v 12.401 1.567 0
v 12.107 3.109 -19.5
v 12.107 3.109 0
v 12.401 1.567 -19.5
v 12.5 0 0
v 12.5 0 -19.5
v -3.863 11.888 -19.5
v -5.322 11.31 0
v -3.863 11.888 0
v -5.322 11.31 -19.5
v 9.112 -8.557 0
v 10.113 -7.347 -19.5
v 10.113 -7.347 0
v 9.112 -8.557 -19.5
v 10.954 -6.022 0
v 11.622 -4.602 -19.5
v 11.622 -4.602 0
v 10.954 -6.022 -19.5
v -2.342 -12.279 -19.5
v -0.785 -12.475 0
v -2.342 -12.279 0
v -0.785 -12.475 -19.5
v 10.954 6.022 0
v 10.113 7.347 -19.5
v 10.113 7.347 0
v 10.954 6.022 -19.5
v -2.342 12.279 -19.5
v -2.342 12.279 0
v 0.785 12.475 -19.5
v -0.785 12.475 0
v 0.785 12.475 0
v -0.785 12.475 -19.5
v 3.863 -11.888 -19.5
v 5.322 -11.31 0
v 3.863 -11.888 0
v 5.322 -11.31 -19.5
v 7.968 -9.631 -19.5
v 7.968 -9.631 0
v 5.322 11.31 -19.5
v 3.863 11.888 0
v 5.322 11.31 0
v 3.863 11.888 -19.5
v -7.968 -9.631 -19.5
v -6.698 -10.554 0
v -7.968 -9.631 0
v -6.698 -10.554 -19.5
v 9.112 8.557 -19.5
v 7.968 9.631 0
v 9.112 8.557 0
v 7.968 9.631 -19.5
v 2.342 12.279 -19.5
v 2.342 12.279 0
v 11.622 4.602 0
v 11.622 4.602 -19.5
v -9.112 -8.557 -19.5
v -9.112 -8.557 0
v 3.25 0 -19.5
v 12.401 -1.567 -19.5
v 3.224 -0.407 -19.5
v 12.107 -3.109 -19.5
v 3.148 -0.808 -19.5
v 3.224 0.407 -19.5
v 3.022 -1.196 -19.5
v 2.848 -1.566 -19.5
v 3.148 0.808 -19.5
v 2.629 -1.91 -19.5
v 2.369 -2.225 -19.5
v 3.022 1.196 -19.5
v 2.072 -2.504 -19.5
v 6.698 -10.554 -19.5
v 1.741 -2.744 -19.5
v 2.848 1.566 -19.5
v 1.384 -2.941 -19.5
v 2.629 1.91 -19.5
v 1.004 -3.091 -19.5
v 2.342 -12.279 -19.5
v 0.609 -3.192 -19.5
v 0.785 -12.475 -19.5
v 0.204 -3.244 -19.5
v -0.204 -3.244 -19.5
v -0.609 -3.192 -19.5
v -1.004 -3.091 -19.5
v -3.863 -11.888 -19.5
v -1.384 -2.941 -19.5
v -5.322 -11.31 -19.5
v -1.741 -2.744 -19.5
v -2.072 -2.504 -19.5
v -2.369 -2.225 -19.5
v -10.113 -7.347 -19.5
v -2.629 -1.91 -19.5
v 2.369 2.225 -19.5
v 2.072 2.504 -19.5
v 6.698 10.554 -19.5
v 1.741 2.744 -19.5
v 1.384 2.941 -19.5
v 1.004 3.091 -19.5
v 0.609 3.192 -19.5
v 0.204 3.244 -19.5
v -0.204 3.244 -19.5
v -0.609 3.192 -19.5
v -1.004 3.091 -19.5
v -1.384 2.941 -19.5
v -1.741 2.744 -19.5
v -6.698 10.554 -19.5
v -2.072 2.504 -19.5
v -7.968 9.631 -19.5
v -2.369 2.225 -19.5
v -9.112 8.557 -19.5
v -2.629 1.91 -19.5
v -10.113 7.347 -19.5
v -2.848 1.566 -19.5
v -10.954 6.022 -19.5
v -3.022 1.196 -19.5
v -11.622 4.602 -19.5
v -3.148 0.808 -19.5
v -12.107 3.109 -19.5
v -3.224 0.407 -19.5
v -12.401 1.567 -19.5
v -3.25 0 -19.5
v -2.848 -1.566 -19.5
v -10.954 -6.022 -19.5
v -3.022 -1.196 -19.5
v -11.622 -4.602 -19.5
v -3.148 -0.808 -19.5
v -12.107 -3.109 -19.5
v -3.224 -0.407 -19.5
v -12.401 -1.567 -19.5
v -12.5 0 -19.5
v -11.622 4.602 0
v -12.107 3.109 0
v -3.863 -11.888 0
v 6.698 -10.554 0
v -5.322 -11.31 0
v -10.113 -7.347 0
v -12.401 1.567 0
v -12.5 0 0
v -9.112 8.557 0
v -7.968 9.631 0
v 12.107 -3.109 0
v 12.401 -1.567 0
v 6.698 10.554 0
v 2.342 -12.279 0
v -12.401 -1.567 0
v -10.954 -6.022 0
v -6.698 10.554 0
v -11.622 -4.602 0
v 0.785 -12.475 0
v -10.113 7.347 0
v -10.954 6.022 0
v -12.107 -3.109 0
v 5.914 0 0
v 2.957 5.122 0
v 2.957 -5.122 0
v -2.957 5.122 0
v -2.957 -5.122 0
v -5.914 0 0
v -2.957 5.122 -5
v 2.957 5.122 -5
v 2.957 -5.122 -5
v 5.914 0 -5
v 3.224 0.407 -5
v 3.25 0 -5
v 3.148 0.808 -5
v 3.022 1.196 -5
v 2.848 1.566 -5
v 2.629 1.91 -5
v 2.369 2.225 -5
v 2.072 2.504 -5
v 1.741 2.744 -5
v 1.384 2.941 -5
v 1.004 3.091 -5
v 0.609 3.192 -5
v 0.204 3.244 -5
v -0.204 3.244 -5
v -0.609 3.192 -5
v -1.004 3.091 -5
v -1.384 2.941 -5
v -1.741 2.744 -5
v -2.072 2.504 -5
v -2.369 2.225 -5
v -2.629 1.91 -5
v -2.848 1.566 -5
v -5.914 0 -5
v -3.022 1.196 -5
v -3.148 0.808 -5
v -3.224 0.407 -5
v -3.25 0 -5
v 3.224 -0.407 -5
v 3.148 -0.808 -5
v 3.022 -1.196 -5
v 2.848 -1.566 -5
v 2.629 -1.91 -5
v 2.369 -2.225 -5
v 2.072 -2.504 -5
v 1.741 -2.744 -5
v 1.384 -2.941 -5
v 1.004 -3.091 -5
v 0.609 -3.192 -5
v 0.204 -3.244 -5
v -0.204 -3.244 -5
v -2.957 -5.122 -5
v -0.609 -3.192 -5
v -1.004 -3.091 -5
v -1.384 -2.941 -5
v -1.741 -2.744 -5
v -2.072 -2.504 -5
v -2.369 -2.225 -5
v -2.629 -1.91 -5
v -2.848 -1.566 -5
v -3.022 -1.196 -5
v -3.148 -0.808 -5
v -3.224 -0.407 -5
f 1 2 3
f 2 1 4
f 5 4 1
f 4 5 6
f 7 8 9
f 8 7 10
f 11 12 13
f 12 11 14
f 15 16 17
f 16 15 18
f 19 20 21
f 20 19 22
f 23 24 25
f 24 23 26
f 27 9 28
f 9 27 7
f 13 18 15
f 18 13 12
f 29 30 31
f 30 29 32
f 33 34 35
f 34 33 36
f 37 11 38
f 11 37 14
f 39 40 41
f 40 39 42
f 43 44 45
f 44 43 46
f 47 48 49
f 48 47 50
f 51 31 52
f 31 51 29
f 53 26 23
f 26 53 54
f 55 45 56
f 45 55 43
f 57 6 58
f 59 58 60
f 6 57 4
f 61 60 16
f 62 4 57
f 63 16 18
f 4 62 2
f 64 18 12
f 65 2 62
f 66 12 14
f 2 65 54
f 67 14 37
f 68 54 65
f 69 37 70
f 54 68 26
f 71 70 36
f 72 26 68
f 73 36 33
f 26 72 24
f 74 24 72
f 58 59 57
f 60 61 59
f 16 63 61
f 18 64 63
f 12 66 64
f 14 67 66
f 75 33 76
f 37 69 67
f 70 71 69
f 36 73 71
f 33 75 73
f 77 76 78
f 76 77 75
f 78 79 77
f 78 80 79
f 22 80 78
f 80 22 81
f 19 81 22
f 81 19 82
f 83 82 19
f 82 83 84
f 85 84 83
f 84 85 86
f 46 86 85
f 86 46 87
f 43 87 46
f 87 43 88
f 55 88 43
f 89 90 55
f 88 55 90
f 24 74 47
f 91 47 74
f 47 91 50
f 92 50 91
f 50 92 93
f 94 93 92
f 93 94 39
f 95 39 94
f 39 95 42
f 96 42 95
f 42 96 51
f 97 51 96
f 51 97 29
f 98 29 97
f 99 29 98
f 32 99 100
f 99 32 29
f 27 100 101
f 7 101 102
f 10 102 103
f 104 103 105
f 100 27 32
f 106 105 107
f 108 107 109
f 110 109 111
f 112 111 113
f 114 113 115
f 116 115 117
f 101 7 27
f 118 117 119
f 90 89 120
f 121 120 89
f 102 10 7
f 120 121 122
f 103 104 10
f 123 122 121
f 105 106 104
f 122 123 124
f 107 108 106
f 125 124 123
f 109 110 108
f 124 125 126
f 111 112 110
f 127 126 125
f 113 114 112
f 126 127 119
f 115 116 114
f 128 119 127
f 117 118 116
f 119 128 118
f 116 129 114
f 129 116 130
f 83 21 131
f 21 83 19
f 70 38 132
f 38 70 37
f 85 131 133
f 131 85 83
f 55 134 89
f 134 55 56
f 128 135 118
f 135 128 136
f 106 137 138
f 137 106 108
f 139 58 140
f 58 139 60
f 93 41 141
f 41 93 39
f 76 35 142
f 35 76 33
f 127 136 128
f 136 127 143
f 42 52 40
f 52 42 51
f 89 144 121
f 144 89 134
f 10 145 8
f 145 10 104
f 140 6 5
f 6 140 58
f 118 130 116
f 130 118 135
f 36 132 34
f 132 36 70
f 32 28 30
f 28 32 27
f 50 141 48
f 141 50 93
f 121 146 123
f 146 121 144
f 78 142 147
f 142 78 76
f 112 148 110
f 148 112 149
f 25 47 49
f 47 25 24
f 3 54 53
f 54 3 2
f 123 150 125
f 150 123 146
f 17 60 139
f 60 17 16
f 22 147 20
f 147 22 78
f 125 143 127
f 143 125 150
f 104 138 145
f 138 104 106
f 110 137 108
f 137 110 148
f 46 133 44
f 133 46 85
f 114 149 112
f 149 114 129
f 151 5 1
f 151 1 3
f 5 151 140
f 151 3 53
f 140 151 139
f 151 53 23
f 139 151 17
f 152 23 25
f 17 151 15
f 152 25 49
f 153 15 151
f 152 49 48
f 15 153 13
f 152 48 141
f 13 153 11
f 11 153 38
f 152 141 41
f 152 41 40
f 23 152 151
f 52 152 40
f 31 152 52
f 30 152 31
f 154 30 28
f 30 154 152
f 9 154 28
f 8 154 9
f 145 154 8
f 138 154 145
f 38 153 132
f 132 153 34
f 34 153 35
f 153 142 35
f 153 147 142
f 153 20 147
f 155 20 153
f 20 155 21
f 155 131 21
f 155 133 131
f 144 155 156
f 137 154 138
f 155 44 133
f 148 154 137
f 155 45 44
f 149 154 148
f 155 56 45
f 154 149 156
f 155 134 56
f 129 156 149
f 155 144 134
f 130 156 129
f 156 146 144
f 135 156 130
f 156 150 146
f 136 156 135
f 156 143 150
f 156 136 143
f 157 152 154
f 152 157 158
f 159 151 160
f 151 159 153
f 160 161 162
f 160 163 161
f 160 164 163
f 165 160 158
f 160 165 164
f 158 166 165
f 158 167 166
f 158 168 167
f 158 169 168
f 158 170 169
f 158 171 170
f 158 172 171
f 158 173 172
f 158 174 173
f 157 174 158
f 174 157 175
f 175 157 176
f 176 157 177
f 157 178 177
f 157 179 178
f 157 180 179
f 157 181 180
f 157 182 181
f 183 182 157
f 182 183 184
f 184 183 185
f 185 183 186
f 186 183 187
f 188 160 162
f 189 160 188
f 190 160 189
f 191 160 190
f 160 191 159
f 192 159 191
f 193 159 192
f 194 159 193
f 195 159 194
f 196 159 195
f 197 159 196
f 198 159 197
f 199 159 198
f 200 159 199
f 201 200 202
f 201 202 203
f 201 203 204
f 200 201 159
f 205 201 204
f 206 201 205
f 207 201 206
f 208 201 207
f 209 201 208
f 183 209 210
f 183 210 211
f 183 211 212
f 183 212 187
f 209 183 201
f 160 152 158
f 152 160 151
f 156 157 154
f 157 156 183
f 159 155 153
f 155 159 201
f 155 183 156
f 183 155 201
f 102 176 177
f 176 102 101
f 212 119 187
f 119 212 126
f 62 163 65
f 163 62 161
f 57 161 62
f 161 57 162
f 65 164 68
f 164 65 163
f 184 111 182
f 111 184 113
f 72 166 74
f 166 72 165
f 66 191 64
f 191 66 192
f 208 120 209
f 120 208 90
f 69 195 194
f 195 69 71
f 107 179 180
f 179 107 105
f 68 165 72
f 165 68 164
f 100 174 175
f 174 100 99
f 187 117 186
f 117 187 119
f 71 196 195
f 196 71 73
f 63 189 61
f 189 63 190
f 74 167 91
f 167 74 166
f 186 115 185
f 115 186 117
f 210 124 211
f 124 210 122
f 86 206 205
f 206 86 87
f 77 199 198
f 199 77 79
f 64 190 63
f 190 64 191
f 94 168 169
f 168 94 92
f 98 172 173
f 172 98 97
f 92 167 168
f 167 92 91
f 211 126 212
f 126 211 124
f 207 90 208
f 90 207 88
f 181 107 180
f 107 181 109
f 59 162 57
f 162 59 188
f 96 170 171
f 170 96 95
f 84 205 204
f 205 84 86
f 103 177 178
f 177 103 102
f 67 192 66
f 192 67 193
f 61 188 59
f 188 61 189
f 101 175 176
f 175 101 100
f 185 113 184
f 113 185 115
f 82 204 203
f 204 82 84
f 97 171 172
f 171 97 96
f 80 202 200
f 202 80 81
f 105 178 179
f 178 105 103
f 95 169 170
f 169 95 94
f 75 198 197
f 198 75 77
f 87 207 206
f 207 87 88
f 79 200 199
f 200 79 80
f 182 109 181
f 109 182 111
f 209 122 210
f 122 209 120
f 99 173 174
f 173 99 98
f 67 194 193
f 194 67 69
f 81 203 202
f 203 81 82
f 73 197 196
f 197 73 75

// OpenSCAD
$fn = 50;

difference() {
	union() {
		translate(v = [0, 0, -19.5]) {
			cylinder(h = 19.5, r = 12.5);
		}
		#translate(v = [0, 0, -21.0]) {
			cylinder(h = 21, r = 2.875);
		}
	}
	union() {
		translate(v = [0, 0, 0]) {
			rotate(a = [0, 0, 0]) {
				difference() {
					union() {
						translate(v = [0, 0, -5]) {
							linear_extrude(height = 5) {
								polygon(points = [[5.914249999999999, 0.0], [2.957125, 5.1218907443321156], [-2.9571249999999982, 5.1218907443321156], [-5.914249999999999, 7.242867331857232e-16], [-2.9571250000000022, -5.121890744332115], [2.9571249999999956, -5.121890744332118]]);
							}
						}
					}
					union();
				}
			}
		}
		#translate(v = [0, 0, -100.0]) {
			cylinder(h = 200, r = 3.25);
		}
	}
}
